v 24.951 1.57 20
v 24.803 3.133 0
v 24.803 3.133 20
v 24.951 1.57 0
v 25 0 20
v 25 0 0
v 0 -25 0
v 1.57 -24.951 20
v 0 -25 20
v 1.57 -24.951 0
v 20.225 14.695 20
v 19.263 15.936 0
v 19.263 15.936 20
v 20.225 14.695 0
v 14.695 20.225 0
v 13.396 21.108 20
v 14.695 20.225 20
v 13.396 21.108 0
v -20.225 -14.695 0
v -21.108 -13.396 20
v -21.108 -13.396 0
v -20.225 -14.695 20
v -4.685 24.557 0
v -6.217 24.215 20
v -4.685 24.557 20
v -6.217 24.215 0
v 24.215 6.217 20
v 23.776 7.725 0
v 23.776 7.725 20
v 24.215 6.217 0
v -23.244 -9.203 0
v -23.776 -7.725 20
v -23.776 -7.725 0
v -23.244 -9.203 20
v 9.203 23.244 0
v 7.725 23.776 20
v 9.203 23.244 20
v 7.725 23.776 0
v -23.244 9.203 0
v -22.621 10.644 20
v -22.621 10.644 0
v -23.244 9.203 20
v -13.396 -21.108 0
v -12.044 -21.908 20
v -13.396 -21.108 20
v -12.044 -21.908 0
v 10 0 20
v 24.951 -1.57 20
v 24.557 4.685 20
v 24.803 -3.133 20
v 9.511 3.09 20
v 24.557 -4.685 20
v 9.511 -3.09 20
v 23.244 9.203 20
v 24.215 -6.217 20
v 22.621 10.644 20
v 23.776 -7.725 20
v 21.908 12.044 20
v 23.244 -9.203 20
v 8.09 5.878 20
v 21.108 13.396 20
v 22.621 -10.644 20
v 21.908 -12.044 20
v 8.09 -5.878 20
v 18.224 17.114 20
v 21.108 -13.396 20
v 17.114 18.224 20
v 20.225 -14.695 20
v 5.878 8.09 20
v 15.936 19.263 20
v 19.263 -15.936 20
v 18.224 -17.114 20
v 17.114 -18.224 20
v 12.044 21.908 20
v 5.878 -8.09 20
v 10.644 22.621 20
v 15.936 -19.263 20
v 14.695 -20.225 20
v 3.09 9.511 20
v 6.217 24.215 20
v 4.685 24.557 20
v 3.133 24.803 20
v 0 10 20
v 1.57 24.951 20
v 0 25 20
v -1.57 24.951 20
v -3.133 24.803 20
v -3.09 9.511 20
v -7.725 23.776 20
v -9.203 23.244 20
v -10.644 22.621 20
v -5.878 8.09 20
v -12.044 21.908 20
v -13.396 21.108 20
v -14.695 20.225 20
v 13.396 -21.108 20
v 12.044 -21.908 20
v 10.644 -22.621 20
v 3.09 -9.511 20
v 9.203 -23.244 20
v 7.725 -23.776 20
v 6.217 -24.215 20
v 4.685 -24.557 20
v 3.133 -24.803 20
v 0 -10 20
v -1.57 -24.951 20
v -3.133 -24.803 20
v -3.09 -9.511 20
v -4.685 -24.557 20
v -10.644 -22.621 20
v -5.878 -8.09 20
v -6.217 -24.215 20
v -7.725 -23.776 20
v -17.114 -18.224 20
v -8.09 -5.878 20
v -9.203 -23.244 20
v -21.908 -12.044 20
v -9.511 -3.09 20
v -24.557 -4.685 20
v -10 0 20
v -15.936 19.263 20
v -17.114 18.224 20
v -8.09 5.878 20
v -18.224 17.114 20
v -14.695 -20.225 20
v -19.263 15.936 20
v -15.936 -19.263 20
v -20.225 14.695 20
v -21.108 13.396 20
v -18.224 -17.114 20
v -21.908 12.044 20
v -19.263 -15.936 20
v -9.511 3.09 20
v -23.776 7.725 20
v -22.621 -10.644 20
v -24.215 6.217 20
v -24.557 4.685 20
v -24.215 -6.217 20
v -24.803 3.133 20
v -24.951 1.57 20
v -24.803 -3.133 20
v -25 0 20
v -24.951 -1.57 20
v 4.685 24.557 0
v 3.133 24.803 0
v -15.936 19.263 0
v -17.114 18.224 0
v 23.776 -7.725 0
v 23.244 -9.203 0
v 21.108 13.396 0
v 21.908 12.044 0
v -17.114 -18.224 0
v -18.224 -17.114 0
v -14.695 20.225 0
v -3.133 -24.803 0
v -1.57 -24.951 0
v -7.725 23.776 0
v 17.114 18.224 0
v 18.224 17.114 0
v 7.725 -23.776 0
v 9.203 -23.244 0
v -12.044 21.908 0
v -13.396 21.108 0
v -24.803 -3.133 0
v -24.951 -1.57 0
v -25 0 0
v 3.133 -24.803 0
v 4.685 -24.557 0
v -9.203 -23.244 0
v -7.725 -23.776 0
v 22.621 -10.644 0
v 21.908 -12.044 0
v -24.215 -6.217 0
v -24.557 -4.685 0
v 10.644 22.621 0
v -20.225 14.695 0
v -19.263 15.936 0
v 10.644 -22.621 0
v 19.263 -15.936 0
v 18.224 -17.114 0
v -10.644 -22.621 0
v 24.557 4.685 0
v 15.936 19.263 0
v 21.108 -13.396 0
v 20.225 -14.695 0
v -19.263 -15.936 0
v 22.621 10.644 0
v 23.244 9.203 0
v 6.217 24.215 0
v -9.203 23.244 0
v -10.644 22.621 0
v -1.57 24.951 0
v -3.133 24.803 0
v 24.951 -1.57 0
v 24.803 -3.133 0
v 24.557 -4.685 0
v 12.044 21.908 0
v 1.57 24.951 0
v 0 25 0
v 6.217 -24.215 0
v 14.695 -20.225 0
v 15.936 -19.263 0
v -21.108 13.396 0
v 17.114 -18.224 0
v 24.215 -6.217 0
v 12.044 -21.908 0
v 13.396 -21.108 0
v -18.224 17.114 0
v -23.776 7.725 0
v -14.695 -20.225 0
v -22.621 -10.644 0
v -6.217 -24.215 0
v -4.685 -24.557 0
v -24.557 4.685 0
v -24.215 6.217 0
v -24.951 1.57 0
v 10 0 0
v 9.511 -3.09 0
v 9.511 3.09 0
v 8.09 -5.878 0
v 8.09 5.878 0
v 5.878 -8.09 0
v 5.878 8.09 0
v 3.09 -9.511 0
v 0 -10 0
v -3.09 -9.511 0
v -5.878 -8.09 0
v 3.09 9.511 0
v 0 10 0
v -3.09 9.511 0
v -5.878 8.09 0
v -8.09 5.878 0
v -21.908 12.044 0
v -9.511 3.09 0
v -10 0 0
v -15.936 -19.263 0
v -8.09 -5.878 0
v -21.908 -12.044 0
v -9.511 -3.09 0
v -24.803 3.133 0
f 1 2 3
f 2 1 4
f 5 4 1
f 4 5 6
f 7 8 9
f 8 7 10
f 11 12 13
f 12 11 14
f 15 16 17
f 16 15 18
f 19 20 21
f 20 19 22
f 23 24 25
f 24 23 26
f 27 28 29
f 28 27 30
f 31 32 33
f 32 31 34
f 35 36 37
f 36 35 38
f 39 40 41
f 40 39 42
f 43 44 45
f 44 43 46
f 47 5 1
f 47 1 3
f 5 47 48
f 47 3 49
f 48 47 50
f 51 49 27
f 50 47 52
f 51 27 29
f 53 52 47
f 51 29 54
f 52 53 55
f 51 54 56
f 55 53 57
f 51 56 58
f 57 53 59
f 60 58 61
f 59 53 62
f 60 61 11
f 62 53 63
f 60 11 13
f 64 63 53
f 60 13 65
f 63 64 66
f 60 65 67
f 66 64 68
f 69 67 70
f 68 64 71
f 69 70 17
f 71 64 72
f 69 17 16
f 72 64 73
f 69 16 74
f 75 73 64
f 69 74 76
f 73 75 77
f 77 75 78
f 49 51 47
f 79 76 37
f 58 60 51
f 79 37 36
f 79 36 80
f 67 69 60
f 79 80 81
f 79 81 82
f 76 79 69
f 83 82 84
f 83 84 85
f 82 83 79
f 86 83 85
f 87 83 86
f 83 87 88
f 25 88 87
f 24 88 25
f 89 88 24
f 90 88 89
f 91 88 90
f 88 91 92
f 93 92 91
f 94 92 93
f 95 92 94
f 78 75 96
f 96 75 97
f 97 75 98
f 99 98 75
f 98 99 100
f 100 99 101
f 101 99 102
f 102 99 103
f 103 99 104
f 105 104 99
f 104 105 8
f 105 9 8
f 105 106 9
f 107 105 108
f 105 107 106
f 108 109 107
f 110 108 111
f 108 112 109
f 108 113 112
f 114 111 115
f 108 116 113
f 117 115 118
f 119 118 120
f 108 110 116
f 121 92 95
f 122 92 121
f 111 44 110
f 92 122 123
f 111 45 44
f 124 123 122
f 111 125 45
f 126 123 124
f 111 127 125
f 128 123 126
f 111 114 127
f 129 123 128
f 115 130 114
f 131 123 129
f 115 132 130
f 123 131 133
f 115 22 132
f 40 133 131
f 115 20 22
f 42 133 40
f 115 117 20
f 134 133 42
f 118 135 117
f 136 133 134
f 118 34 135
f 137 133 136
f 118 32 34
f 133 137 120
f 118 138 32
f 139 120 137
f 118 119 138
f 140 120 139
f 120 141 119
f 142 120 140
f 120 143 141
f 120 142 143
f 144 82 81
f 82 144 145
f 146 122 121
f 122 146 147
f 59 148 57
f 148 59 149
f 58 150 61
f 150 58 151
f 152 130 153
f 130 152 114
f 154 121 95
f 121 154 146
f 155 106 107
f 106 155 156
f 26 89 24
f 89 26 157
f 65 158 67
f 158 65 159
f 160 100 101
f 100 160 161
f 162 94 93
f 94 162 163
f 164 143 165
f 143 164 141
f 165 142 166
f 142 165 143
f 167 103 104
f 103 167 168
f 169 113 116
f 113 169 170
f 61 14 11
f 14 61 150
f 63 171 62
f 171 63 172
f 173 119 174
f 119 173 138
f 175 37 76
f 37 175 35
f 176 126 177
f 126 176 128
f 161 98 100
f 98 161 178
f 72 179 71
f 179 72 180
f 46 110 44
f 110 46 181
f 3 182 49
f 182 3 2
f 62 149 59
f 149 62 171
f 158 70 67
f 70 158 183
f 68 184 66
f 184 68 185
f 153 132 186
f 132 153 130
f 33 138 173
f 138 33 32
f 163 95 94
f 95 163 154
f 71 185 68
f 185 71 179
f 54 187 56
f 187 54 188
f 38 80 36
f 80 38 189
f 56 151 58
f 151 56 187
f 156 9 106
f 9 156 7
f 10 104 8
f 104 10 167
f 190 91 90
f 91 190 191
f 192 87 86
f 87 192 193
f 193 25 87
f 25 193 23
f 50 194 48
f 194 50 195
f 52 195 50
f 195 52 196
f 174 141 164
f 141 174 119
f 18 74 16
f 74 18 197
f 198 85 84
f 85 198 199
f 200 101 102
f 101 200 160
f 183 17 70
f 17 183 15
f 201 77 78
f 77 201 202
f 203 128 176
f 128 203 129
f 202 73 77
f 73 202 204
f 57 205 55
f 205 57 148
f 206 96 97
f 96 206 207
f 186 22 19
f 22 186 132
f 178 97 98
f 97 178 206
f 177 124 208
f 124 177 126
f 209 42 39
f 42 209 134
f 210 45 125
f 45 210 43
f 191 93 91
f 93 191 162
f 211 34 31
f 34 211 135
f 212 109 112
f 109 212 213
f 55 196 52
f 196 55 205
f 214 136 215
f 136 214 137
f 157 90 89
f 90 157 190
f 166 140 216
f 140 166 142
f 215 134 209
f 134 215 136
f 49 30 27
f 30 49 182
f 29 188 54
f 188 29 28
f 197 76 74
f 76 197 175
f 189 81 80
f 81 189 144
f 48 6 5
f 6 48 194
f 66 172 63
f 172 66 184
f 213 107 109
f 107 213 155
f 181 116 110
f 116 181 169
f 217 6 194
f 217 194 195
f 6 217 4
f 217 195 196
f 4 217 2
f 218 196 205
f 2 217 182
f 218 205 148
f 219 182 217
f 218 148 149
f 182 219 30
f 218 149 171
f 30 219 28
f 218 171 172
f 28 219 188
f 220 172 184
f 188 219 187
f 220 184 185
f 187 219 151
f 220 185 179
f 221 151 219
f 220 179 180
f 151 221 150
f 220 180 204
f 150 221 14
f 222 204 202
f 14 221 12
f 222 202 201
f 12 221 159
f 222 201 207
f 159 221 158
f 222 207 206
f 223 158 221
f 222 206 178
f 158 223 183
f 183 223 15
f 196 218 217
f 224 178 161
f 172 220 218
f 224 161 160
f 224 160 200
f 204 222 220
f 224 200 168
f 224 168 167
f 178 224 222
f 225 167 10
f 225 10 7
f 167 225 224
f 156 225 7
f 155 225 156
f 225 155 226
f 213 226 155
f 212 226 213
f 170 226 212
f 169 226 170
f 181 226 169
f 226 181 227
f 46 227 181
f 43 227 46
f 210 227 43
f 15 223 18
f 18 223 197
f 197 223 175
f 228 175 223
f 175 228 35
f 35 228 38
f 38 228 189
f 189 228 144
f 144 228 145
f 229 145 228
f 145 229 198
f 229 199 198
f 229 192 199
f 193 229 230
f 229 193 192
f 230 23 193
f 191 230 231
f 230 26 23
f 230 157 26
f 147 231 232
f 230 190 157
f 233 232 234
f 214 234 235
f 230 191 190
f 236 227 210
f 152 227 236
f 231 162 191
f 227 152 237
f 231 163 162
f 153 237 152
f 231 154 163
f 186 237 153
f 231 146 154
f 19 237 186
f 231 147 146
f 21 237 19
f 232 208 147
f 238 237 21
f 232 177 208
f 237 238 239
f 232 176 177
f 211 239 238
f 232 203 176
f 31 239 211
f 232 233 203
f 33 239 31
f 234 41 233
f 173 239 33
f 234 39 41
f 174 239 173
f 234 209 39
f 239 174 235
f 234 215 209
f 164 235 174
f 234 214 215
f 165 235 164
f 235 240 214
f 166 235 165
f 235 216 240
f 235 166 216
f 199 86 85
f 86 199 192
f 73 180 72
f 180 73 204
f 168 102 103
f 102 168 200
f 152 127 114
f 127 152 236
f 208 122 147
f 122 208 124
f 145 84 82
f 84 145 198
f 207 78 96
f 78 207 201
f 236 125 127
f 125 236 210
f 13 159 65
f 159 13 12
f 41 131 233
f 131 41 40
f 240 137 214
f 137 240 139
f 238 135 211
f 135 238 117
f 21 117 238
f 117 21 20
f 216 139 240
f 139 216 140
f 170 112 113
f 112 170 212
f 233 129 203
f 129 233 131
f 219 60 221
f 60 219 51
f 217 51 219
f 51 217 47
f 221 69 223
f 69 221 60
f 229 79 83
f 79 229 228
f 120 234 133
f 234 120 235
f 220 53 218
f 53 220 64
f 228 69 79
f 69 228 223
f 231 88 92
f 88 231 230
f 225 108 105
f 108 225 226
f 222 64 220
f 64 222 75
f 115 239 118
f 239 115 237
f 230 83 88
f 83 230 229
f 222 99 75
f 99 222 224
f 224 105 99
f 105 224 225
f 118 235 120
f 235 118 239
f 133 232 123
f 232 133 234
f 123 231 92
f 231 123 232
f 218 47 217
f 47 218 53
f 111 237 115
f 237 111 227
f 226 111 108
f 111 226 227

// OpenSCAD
// En este ejemplo veremos toda la potencia de OpenSCAD con la
//     parametrización de objetos. Partimos de la rueda con el agujero en
//     el centro de ejemplos atrás.

// Parámetros de la rueda
diametro = 50;  // Diametro
grosor = 20;    // Grosor
diam_eje = 20;  // Diametro del agujero

// Cilindro con agujero centrarl
difference(){
    // Cilindro exterior
    cylinder(r=diametro/2, h=grosor, $fn=100);
    // Cilindro taladro central.
    cylinder(r=diam_eje/2, h=grosor*3, $fn=20, center=true);
    // NOTA: Multiplicamos por 3 la altura para asegurar que se atraviesa completamente la figura.
    }
